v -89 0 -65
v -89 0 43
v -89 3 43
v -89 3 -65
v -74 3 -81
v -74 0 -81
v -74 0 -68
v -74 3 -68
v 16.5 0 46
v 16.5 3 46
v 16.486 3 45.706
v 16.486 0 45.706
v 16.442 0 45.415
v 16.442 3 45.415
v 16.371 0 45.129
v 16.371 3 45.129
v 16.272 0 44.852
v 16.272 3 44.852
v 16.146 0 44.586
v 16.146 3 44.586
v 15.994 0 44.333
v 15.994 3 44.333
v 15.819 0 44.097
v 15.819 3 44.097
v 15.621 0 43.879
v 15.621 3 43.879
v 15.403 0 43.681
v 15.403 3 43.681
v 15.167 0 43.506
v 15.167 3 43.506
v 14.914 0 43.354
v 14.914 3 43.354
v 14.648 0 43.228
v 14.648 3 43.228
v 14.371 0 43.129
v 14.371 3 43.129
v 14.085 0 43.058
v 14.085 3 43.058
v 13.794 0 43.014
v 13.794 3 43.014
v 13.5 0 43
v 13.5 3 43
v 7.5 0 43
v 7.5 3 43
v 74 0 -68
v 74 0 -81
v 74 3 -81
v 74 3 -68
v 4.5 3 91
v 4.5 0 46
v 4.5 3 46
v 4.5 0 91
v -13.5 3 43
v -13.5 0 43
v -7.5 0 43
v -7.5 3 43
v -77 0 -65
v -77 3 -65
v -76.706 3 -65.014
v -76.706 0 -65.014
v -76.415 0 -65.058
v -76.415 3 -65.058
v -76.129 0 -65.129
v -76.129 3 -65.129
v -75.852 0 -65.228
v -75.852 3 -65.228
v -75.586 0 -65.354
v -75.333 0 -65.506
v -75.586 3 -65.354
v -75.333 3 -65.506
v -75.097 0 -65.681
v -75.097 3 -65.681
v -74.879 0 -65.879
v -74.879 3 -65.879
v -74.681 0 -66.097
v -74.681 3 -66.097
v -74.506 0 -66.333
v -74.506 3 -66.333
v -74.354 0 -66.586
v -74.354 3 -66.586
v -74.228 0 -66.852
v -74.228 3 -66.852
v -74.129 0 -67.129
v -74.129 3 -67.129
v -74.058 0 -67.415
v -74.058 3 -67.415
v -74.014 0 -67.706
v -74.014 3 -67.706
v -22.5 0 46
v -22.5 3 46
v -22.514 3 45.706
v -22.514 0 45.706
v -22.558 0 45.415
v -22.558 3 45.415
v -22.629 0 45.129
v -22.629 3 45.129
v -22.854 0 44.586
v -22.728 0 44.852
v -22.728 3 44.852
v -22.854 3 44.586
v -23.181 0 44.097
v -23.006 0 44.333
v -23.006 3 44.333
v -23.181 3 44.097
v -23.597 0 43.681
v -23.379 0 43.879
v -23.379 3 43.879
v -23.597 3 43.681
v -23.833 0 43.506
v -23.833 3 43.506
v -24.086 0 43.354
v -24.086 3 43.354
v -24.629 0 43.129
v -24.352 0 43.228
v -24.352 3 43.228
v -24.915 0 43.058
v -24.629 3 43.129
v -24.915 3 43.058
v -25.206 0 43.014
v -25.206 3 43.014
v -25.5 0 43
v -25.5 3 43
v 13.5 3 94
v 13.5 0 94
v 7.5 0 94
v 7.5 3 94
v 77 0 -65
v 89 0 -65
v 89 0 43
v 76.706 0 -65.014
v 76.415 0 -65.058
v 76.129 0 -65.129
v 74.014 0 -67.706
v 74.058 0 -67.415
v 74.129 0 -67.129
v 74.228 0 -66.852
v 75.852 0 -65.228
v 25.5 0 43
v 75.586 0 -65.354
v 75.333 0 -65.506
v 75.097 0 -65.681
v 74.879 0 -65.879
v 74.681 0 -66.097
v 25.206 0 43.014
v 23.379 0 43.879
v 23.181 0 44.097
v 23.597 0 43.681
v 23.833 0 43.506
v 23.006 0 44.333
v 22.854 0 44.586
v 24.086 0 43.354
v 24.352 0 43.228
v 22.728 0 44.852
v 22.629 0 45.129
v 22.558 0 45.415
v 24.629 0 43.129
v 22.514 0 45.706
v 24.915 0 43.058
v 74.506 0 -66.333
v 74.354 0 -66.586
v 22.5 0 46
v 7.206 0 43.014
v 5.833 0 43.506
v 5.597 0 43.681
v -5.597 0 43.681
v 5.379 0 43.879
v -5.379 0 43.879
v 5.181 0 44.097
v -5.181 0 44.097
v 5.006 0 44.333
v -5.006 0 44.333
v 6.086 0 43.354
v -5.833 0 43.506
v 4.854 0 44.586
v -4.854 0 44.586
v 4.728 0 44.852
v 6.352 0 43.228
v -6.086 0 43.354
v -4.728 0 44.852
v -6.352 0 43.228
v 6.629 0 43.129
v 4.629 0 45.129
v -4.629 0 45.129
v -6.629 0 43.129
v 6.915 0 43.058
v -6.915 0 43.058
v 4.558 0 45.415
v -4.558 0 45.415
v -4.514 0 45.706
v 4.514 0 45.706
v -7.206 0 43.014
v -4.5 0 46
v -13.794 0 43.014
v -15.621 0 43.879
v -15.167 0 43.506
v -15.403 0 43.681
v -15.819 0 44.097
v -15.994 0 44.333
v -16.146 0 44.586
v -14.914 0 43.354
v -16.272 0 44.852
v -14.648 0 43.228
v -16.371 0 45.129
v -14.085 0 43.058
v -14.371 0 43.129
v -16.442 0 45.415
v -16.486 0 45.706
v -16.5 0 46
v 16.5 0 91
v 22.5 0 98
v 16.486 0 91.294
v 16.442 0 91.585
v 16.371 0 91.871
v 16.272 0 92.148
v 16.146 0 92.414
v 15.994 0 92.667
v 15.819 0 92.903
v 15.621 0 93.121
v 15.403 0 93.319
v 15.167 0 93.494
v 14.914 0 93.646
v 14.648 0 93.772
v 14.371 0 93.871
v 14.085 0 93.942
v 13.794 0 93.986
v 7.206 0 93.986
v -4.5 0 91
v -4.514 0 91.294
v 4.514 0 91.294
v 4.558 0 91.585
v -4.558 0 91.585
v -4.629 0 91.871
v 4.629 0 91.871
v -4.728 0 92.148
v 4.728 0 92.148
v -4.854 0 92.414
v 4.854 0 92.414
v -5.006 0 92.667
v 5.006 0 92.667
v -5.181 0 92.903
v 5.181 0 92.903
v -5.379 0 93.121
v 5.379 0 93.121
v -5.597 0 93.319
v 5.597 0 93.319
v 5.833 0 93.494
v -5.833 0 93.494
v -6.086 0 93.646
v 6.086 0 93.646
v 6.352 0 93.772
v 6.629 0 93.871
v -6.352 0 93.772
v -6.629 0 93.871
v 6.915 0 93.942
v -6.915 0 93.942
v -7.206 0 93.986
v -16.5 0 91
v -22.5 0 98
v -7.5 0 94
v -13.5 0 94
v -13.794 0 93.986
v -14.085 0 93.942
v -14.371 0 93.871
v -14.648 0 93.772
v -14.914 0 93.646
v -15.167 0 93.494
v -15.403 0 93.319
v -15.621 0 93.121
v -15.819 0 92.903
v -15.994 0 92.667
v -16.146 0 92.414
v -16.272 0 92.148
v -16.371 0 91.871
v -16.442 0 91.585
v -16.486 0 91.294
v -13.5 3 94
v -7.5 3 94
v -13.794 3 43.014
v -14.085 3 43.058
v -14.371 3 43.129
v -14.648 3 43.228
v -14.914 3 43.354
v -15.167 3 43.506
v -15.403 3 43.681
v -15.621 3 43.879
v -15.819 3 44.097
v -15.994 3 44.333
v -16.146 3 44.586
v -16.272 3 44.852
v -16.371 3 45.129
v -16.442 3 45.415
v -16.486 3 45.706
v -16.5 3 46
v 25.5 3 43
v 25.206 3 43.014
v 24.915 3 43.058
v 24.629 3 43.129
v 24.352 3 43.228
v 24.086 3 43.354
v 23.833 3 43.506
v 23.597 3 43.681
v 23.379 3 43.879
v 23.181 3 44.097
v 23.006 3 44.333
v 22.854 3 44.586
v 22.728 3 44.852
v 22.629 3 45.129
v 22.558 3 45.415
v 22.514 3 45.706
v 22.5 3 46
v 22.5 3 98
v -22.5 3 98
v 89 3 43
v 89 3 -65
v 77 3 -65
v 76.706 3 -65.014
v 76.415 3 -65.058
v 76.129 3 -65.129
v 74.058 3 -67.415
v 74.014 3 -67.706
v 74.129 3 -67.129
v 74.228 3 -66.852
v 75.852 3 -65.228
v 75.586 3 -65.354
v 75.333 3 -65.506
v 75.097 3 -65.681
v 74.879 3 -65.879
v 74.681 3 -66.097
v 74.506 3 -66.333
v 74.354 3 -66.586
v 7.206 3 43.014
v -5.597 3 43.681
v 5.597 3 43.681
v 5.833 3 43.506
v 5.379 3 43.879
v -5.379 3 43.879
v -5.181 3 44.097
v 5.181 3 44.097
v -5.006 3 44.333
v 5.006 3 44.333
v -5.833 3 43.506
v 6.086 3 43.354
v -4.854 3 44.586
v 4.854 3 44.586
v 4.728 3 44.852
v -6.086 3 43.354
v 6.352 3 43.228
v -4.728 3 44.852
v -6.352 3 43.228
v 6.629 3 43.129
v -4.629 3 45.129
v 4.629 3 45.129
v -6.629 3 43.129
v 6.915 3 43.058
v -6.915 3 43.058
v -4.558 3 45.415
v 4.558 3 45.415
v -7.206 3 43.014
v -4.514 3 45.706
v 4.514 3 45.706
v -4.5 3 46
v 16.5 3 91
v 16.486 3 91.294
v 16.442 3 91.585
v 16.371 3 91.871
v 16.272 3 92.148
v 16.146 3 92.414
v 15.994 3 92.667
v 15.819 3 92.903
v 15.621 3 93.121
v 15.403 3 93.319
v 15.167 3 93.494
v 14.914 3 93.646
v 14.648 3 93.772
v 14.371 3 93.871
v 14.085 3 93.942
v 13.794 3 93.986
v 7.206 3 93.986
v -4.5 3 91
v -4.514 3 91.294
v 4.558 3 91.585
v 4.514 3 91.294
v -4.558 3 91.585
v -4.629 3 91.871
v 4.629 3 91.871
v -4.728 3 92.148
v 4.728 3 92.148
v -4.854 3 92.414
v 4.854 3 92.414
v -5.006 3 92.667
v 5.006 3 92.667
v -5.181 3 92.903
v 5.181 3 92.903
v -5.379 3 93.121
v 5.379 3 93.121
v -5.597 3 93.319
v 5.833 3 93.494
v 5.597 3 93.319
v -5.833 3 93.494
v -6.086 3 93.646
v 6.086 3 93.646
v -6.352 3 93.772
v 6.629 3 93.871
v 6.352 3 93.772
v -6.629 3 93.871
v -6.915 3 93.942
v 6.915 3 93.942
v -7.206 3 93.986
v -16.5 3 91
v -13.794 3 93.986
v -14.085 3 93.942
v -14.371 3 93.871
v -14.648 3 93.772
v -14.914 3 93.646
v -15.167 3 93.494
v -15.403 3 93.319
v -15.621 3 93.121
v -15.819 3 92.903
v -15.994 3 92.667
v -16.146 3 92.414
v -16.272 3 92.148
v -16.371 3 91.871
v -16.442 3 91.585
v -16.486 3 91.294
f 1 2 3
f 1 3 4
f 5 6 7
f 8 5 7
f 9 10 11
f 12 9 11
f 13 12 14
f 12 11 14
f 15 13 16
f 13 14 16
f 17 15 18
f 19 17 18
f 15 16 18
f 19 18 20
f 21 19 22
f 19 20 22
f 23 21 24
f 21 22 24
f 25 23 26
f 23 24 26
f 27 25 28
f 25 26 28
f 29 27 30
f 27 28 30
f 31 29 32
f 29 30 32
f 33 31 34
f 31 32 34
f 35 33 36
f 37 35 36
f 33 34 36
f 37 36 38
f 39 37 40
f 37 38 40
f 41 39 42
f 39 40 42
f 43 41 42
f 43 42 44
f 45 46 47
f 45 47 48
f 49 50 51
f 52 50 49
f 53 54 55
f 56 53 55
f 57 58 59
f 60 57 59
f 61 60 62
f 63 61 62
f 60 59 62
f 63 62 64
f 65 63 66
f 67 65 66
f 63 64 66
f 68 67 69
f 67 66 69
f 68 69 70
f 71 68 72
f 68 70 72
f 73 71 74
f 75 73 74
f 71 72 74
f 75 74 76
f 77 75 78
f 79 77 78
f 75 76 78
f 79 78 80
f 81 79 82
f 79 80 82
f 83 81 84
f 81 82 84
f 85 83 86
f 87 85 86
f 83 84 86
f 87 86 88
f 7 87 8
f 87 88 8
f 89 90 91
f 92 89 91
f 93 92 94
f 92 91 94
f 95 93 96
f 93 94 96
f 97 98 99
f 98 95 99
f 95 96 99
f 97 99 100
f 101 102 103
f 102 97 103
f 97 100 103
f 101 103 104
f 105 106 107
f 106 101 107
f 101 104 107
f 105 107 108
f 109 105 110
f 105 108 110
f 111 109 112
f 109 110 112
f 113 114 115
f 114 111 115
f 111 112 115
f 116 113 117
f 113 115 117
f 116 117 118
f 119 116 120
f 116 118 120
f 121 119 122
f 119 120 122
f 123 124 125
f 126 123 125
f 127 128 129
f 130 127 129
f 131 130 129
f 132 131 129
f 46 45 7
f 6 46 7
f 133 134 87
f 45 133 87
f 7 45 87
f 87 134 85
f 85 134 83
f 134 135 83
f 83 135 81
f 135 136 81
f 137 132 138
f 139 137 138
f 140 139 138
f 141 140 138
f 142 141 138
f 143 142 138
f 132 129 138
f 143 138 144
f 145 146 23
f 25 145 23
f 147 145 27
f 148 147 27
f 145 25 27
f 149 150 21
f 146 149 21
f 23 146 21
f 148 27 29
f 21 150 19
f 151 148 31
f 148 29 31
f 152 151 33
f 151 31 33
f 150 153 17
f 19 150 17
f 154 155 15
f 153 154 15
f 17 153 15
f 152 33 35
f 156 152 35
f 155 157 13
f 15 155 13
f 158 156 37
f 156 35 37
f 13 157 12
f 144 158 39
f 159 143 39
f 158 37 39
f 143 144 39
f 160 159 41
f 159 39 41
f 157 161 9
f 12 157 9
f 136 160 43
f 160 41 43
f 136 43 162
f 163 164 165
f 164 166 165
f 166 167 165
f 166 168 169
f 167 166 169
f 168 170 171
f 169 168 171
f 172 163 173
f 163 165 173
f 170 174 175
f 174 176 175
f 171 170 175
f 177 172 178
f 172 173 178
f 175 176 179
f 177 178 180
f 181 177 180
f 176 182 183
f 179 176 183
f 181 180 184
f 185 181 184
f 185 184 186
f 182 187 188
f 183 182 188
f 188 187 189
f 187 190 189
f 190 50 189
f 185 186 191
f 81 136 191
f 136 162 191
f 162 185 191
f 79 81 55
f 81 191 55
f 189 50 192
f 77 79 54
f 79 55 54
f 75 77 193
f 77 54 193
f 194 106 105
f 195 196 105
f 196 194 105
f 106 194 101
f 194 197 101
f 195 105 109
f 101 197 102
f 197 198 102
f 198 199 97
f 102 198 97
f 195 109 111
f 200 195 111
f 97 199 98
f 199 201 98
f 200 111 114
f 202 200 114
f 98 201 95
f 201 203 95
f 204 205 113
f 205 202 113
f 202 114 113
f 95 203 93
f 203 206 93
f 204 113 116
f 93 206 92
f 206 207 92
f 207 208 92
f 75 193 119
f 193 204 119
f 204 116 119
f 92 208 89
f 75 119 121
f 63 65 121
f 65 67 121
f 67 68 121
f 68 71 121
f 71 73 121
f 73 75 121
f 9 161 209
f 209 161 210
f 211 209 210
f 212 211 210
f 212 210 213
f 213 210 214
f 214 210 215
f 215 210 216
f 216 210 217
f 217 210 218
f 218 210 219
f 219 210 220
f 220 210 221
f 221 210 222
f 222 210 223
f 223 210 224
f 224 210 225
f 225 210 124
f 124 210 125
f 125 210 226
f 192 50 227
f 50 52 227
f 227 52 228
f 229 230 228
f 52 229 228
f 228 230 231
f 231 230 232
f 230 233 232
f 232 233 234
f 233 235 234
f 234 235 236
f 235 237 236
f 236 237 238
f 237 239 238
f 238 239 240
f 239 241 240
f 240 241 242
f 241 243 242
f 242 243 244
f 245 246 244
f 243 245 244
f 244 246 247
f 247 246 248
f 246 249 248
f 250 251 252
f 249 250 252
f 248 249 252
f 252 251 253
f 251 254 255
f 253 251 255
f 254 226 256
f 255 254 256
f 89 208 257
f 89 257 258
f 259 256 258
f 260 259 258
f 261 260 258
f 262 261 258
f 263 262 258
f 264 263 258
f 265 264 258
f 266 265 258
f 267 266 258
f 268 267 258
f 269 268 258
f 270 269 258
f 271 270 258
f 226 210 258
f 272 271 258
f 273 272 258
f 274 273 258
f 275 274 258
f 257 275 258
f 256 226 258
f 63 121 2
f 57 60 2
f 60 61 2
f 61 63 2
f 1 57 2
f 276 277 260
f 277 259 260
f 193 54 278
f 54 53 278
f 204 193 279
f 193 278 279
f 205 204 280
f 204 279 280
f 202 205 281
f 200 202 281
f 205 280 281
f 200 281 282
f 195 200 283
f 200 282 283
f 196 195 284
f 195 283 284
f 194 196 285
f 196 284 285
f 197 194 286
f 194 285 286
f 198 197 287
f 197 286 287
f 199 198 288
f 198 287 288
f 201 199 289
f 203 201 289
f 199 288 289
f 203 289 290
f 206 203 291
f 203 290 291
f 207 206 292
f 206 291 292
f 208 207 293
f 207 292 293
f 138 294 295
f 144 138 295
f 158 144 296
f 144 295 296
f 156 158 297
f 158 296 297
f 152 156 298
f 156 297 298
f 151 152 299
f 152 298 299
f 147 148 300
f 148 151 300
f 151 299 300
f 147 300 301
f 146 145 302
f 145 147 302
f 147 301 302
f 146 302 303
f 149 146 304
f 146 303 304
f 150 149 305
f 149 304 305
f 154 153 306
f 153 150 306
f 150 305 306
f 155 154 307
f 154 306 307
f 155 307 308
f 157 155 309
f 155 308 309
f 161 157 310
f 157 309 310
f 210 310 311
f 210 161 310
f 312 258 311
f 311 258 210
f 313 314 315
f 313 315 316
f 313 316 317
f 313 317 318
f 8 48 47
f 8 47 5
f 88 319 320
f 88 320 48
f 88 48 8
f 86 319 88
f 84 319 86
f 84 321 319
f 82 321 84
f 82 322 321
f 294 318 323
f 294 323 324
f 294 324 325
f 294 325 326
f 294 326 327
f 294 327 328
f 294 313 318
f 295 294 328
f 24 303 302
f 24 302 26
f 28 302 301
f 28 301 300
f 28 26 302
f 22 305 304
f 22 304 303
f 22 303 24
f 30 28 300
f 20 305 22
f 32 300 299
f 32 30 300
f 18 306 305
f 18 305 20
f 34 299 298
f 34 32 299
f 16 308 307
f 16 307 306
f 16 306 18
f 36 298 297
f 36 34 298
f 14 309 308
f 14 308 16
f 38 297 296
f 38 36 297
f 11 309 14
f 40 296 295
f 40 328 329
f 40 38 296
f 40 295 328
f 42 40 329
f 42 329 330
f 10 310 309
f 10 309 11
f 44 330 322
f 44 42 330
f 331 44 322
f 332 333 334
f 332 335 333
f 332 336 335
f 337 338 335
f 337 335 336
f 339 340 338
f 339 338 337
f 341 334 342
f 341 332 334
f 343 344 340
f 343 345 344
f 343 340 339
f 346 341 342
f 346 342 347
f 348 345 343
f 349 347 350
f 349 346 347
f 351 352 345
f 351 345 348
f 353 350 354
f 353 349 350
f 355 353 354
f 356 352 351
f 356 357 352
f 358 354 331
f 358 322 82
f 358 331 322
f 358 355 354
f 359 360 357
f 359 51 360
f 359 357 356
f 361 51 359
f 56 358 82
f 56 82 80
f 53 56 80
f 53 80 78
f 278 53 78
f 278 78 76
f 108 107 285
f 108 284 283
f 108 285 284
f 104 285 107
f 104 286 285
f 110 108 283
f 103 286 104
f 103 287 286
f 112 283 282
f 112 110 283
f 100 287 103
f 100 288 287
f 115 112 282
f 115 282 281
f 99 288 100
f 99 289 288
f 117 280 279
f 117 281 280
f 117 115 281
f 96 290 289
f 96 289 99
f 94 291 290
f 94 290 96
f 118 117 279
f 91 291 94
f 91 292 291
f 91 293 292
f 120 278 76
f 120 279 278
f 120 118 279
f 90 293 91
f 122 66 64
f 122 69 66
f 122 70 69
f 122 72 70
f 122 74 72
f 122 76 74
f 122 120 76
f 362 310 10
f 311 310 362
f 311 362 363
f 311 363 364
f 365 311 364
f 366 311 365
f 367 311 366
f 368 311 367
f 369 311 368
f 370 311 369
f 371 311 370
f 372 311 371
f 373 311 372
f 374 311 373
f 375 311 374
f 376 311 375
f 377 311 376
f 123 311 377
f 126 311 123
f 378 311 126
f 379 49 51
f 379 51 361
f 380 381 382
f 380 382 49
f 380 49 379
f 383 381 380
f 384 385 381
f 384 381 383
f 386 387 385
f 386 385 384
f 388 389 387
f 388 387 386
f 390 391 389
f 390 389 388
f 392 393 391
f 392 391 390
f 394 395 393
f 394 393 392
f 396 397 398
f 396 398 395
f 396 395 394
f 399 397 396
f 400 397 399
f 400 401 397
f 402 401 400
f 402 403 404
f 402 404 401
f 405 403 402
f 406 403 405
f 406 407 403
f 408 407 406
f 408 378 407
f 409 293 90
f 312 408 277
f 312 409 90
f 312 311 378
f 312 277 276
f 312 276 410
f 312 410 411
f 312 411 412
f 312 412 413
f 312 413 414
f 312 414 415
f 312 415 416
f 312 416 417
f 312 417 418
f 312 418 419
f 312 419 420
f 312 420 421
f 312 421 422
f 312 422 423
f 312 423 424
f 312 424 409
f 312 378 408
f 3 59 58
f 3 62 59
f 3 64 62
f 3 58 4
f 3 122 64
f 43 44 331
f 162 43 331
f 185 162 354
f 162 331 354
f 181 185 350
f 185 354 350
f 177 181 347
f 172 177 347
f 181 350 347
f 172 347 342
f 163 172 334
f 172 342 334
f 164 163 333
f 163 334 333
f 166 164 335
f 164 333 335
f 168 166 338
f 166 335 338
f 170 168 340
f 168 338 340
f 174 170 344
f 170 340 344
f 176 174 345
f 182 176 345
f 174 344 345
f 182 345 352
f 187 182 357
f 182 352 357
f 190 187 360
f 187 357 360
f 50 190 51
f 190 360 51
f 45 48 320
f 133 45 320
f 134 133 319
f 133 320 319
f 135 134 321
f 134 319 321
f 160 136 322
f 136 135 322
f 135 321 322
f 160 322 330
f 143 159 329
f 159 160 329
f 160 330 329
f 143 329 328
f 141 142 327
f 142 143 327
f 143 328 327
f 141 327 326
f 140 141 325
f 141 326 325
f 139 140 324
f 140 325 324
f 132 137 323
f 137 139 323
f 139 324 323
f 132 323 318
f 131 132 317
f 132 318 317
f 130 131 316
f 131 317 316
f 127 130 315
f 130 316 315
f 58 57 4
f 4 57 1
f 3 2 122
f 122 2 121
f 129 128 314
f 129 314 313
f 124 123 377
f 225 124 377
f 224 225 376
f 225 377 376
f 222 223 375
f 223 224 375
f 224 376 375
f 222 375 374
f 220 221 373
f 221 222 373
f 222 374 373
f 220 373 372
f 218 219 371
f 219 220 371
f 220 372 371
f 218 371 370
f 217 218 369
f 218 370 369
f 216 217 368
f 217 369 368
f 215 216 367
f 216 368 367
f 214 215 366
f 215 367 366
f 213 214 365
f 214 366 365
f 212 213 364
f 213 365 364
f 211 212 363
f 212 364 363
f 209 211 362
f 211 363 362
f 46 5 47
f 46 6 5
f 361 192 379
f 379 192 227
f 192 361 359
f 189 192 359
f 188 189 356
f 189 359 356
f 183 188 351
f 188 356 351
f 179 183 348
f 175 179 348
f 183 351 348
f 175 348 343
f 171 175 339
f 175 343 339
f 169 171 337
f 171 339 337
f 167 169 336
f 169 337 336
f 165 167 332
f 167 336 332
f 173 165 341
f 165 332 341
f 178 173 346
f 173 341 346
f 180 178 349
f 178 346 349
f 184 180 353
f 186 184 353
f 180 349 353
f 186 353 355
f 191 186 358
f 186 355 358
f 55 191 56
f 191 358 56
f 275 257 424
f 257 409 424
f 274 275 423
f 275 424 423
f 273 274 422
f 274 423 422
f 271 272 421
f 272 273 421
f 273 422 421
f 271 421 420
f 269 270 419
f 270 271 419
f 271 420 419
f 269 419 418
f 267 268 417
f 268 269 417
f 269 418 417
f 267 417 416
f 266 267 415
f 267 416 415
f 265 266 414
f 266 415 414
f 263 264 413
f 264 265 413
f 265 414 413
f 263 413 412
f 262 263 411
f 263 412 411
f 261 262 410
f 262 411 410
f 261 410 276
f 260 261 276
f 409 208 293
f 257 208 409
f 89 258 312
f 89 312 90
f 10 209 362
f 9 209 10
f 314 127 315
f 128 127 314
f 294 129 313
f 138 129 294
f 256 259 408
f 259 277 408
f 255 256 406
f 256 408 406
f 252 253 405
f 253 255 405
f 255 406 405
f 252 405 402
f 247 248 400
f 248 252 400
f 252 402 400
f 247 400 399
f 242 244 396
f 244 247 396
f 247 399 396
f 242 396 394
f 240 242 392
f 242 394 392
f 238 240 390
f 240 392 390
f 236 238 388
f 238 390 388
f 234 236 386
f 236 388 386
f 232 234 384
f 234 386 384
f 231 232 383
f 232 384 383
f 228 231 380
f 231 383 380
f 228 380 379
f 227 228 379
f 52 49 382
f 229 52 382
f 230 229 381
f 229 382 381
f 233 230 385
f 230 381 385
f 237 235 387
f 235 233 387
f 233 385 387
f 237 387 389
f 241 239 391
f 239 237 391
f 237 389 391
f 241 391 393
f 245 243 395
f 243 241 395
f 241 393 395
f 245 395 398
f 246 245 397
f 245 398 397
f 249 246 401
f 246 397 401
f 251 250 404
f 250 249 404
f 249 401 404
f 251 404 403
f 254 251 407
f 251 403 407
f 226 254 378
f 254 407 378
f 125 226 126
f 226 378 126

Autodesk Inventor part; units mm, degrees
ref_plane "YZ Plane" through (0, 0, 0) normal (1, 0, 0) x (0, 1, 0)
ref_plane "XZ Plane" through (0, 0, 0) normal (0, 1, 0) x (-1, 0, 0)
ref_plane "XY Plane" through (0, 0, 0) normal (0, 0, 1) x (1, 0, 0)
sketch "Sketch2" plane through (0, 0, 0) normal (0, 1, 0) x (-1, 0, 0)
  line L0 (-89, 99) -> (89, 99)
  line L1 (89, 99) -> (89, -99)
  line L2 (89, -99) -> (-89, -99)
  line L3 (-89, -99) -> (-89, 99)
  line L4 (-89, 99) -> (89, -99) construction
  line L5 (89, 99) -> (-89, -99) construction
  line L6 (-89, 99) -> (89, 99)
  line L7 (89, 99) -> (89, -81)
  line L8 (89, -81) -> (-89, -81)
  line L9 (-89, -81) -> (-89, 99)
  line L10 (-4.5, 99) -> (-89, 99)
  line L11 (-89, 99) -> (-89, 43)
  line L12 (-89, 43) -> (-4.5, 43)
  line L13 (-4.5, 43) -> (-4.5, 99)
  line L14 (4.5, 99) -> (89, 99)
  line L15 (89, 99) -> (89, 43)
  line L16 (89, 43) -> (4.5, 43)
  line L17 (4.5, 43) -> (4.5, 99)
  line L18 (22.5, 77.5) -> (22.5, 66.5) projected
  line L19 (16.5, 66.5) -> (16.5, 77.5) projected
  line L20 (-22.5, 66.5) -> (-22.5, 77.5) projected
  line L21 (-16.5, 77.5) -> (-16.5, 66.5) projected
  line L22 (-22.5, 99) -> (-16.5, 99)
  line L23 (-16.5, 99) -> (-16.5, 43)
  line L24 (-16.5, 43) -> (-22.5, 43)
  line L25 (-22.5, 43) -> (-22.5, 99)
  line L26 (16.5, 99) -> (22.5, 99)
  line L27 (22.5, 99) -> (22.5, 43)
  line L28 (22.5, 43) -> (16.5, 43)
  line L29 (16.5, 43) -> (16.5, 99)
  line L30 (-89, 99) -> (89, 99)
  line L31 (89, 99) -> (89, 98)
  line L32 (89, 98) -> (-89, 98)
  line L33 (-89, 98) -> (-89, 99)
  line L34 (89, -81) -> (74, -81)
  line L35 (74, -81) -> (74, -65)
  line L36 (74, -65) -> (89, -65)
  line L37 (89, -65) -> (89, -81)
  line L38 (-89, -81) -> (-74, -81)
  line L39 (-74, -81) -> (-74, -65)
  line L40 (-74, -65) -> (-89, -65)
  line L41 (-89, -65) -> (-89, -81)
  line L42 (16.5, 98) -> (-16.5, 98)
  line L43 (-16.5, 98) -> (-16.5, 94)
  line L44 (-16.5, 94) -> (16.5, 94)
  line L45 (16.5, 94) -> (16.5, 98)
  point P0 (0, 0)
  point P1 (4.5, 99)
  point P2 (-4.5, 99)
  point P3 (-89, 43)
  point P4 (89, 43)
  point P5 (4.5, 98)
  point P6 (-4.5, 98)
  point P7 (-16.5, 98)
  point P8 (-22.5, 98)
  point P9 (22.5, 98)
  point P10 (16.5, 98)
  point P11 (-4.5, 94)
  point P12 (4.5, 94)
  point P13 (16.5, 94)
  dimension "d8" = 178
  dimension "d9" = 198
  dimension "d10" = 18
  dimension "d11" = 84.5
  dimension "d13" = 84.5
  dimension "d17" = 9
  dimension "d18" = 1
  dimension "d19" = 15
  dimension "d20" = 16
  dimension "d21" = 15
  dimension "d22" = 16
  dimension "d75" = 55
  dimension "d76" = 55
  dimension "d77" = 6
  dimension "d78" = 6
  dimension "d79" = 4
extrude "Extrusion2" add sketch "Sketch2" along normal blind 3 contours L32 L23 L21 L12 L25 L20 | L12 L13 L44 L17 L16 L1 L36 L35 L8 L39 L40 L3 | L32 L13 L44 L23 | L32 L17 L44 L13 | L32 L29 L44 L17 | L32 L27 L18 L16 L29 L19
fillet "Fillet1" radius 3 6 edges at (22.5, 1.5, 43) (-22.5, 1.5, 43) (-16.5, 1.5, 43) (-4.5, 1.5, 43) (4.5, 1.5, 43) (16.5, 1.5, 43)
fillet "Fillet2" radius 3 2 edges at (74, 1.5, -65) (-74, 1.5, -65)
fillet "Fillet3" radius 3 4 edges at (16.5, 1.5, 94) (4.5, 1.5, 94) (-4.5, 1.5, 94) (-16.5, 1.5, 94)
equation "\"d11\" = d13"
properties part number "base" material "Aluminum 6061"
